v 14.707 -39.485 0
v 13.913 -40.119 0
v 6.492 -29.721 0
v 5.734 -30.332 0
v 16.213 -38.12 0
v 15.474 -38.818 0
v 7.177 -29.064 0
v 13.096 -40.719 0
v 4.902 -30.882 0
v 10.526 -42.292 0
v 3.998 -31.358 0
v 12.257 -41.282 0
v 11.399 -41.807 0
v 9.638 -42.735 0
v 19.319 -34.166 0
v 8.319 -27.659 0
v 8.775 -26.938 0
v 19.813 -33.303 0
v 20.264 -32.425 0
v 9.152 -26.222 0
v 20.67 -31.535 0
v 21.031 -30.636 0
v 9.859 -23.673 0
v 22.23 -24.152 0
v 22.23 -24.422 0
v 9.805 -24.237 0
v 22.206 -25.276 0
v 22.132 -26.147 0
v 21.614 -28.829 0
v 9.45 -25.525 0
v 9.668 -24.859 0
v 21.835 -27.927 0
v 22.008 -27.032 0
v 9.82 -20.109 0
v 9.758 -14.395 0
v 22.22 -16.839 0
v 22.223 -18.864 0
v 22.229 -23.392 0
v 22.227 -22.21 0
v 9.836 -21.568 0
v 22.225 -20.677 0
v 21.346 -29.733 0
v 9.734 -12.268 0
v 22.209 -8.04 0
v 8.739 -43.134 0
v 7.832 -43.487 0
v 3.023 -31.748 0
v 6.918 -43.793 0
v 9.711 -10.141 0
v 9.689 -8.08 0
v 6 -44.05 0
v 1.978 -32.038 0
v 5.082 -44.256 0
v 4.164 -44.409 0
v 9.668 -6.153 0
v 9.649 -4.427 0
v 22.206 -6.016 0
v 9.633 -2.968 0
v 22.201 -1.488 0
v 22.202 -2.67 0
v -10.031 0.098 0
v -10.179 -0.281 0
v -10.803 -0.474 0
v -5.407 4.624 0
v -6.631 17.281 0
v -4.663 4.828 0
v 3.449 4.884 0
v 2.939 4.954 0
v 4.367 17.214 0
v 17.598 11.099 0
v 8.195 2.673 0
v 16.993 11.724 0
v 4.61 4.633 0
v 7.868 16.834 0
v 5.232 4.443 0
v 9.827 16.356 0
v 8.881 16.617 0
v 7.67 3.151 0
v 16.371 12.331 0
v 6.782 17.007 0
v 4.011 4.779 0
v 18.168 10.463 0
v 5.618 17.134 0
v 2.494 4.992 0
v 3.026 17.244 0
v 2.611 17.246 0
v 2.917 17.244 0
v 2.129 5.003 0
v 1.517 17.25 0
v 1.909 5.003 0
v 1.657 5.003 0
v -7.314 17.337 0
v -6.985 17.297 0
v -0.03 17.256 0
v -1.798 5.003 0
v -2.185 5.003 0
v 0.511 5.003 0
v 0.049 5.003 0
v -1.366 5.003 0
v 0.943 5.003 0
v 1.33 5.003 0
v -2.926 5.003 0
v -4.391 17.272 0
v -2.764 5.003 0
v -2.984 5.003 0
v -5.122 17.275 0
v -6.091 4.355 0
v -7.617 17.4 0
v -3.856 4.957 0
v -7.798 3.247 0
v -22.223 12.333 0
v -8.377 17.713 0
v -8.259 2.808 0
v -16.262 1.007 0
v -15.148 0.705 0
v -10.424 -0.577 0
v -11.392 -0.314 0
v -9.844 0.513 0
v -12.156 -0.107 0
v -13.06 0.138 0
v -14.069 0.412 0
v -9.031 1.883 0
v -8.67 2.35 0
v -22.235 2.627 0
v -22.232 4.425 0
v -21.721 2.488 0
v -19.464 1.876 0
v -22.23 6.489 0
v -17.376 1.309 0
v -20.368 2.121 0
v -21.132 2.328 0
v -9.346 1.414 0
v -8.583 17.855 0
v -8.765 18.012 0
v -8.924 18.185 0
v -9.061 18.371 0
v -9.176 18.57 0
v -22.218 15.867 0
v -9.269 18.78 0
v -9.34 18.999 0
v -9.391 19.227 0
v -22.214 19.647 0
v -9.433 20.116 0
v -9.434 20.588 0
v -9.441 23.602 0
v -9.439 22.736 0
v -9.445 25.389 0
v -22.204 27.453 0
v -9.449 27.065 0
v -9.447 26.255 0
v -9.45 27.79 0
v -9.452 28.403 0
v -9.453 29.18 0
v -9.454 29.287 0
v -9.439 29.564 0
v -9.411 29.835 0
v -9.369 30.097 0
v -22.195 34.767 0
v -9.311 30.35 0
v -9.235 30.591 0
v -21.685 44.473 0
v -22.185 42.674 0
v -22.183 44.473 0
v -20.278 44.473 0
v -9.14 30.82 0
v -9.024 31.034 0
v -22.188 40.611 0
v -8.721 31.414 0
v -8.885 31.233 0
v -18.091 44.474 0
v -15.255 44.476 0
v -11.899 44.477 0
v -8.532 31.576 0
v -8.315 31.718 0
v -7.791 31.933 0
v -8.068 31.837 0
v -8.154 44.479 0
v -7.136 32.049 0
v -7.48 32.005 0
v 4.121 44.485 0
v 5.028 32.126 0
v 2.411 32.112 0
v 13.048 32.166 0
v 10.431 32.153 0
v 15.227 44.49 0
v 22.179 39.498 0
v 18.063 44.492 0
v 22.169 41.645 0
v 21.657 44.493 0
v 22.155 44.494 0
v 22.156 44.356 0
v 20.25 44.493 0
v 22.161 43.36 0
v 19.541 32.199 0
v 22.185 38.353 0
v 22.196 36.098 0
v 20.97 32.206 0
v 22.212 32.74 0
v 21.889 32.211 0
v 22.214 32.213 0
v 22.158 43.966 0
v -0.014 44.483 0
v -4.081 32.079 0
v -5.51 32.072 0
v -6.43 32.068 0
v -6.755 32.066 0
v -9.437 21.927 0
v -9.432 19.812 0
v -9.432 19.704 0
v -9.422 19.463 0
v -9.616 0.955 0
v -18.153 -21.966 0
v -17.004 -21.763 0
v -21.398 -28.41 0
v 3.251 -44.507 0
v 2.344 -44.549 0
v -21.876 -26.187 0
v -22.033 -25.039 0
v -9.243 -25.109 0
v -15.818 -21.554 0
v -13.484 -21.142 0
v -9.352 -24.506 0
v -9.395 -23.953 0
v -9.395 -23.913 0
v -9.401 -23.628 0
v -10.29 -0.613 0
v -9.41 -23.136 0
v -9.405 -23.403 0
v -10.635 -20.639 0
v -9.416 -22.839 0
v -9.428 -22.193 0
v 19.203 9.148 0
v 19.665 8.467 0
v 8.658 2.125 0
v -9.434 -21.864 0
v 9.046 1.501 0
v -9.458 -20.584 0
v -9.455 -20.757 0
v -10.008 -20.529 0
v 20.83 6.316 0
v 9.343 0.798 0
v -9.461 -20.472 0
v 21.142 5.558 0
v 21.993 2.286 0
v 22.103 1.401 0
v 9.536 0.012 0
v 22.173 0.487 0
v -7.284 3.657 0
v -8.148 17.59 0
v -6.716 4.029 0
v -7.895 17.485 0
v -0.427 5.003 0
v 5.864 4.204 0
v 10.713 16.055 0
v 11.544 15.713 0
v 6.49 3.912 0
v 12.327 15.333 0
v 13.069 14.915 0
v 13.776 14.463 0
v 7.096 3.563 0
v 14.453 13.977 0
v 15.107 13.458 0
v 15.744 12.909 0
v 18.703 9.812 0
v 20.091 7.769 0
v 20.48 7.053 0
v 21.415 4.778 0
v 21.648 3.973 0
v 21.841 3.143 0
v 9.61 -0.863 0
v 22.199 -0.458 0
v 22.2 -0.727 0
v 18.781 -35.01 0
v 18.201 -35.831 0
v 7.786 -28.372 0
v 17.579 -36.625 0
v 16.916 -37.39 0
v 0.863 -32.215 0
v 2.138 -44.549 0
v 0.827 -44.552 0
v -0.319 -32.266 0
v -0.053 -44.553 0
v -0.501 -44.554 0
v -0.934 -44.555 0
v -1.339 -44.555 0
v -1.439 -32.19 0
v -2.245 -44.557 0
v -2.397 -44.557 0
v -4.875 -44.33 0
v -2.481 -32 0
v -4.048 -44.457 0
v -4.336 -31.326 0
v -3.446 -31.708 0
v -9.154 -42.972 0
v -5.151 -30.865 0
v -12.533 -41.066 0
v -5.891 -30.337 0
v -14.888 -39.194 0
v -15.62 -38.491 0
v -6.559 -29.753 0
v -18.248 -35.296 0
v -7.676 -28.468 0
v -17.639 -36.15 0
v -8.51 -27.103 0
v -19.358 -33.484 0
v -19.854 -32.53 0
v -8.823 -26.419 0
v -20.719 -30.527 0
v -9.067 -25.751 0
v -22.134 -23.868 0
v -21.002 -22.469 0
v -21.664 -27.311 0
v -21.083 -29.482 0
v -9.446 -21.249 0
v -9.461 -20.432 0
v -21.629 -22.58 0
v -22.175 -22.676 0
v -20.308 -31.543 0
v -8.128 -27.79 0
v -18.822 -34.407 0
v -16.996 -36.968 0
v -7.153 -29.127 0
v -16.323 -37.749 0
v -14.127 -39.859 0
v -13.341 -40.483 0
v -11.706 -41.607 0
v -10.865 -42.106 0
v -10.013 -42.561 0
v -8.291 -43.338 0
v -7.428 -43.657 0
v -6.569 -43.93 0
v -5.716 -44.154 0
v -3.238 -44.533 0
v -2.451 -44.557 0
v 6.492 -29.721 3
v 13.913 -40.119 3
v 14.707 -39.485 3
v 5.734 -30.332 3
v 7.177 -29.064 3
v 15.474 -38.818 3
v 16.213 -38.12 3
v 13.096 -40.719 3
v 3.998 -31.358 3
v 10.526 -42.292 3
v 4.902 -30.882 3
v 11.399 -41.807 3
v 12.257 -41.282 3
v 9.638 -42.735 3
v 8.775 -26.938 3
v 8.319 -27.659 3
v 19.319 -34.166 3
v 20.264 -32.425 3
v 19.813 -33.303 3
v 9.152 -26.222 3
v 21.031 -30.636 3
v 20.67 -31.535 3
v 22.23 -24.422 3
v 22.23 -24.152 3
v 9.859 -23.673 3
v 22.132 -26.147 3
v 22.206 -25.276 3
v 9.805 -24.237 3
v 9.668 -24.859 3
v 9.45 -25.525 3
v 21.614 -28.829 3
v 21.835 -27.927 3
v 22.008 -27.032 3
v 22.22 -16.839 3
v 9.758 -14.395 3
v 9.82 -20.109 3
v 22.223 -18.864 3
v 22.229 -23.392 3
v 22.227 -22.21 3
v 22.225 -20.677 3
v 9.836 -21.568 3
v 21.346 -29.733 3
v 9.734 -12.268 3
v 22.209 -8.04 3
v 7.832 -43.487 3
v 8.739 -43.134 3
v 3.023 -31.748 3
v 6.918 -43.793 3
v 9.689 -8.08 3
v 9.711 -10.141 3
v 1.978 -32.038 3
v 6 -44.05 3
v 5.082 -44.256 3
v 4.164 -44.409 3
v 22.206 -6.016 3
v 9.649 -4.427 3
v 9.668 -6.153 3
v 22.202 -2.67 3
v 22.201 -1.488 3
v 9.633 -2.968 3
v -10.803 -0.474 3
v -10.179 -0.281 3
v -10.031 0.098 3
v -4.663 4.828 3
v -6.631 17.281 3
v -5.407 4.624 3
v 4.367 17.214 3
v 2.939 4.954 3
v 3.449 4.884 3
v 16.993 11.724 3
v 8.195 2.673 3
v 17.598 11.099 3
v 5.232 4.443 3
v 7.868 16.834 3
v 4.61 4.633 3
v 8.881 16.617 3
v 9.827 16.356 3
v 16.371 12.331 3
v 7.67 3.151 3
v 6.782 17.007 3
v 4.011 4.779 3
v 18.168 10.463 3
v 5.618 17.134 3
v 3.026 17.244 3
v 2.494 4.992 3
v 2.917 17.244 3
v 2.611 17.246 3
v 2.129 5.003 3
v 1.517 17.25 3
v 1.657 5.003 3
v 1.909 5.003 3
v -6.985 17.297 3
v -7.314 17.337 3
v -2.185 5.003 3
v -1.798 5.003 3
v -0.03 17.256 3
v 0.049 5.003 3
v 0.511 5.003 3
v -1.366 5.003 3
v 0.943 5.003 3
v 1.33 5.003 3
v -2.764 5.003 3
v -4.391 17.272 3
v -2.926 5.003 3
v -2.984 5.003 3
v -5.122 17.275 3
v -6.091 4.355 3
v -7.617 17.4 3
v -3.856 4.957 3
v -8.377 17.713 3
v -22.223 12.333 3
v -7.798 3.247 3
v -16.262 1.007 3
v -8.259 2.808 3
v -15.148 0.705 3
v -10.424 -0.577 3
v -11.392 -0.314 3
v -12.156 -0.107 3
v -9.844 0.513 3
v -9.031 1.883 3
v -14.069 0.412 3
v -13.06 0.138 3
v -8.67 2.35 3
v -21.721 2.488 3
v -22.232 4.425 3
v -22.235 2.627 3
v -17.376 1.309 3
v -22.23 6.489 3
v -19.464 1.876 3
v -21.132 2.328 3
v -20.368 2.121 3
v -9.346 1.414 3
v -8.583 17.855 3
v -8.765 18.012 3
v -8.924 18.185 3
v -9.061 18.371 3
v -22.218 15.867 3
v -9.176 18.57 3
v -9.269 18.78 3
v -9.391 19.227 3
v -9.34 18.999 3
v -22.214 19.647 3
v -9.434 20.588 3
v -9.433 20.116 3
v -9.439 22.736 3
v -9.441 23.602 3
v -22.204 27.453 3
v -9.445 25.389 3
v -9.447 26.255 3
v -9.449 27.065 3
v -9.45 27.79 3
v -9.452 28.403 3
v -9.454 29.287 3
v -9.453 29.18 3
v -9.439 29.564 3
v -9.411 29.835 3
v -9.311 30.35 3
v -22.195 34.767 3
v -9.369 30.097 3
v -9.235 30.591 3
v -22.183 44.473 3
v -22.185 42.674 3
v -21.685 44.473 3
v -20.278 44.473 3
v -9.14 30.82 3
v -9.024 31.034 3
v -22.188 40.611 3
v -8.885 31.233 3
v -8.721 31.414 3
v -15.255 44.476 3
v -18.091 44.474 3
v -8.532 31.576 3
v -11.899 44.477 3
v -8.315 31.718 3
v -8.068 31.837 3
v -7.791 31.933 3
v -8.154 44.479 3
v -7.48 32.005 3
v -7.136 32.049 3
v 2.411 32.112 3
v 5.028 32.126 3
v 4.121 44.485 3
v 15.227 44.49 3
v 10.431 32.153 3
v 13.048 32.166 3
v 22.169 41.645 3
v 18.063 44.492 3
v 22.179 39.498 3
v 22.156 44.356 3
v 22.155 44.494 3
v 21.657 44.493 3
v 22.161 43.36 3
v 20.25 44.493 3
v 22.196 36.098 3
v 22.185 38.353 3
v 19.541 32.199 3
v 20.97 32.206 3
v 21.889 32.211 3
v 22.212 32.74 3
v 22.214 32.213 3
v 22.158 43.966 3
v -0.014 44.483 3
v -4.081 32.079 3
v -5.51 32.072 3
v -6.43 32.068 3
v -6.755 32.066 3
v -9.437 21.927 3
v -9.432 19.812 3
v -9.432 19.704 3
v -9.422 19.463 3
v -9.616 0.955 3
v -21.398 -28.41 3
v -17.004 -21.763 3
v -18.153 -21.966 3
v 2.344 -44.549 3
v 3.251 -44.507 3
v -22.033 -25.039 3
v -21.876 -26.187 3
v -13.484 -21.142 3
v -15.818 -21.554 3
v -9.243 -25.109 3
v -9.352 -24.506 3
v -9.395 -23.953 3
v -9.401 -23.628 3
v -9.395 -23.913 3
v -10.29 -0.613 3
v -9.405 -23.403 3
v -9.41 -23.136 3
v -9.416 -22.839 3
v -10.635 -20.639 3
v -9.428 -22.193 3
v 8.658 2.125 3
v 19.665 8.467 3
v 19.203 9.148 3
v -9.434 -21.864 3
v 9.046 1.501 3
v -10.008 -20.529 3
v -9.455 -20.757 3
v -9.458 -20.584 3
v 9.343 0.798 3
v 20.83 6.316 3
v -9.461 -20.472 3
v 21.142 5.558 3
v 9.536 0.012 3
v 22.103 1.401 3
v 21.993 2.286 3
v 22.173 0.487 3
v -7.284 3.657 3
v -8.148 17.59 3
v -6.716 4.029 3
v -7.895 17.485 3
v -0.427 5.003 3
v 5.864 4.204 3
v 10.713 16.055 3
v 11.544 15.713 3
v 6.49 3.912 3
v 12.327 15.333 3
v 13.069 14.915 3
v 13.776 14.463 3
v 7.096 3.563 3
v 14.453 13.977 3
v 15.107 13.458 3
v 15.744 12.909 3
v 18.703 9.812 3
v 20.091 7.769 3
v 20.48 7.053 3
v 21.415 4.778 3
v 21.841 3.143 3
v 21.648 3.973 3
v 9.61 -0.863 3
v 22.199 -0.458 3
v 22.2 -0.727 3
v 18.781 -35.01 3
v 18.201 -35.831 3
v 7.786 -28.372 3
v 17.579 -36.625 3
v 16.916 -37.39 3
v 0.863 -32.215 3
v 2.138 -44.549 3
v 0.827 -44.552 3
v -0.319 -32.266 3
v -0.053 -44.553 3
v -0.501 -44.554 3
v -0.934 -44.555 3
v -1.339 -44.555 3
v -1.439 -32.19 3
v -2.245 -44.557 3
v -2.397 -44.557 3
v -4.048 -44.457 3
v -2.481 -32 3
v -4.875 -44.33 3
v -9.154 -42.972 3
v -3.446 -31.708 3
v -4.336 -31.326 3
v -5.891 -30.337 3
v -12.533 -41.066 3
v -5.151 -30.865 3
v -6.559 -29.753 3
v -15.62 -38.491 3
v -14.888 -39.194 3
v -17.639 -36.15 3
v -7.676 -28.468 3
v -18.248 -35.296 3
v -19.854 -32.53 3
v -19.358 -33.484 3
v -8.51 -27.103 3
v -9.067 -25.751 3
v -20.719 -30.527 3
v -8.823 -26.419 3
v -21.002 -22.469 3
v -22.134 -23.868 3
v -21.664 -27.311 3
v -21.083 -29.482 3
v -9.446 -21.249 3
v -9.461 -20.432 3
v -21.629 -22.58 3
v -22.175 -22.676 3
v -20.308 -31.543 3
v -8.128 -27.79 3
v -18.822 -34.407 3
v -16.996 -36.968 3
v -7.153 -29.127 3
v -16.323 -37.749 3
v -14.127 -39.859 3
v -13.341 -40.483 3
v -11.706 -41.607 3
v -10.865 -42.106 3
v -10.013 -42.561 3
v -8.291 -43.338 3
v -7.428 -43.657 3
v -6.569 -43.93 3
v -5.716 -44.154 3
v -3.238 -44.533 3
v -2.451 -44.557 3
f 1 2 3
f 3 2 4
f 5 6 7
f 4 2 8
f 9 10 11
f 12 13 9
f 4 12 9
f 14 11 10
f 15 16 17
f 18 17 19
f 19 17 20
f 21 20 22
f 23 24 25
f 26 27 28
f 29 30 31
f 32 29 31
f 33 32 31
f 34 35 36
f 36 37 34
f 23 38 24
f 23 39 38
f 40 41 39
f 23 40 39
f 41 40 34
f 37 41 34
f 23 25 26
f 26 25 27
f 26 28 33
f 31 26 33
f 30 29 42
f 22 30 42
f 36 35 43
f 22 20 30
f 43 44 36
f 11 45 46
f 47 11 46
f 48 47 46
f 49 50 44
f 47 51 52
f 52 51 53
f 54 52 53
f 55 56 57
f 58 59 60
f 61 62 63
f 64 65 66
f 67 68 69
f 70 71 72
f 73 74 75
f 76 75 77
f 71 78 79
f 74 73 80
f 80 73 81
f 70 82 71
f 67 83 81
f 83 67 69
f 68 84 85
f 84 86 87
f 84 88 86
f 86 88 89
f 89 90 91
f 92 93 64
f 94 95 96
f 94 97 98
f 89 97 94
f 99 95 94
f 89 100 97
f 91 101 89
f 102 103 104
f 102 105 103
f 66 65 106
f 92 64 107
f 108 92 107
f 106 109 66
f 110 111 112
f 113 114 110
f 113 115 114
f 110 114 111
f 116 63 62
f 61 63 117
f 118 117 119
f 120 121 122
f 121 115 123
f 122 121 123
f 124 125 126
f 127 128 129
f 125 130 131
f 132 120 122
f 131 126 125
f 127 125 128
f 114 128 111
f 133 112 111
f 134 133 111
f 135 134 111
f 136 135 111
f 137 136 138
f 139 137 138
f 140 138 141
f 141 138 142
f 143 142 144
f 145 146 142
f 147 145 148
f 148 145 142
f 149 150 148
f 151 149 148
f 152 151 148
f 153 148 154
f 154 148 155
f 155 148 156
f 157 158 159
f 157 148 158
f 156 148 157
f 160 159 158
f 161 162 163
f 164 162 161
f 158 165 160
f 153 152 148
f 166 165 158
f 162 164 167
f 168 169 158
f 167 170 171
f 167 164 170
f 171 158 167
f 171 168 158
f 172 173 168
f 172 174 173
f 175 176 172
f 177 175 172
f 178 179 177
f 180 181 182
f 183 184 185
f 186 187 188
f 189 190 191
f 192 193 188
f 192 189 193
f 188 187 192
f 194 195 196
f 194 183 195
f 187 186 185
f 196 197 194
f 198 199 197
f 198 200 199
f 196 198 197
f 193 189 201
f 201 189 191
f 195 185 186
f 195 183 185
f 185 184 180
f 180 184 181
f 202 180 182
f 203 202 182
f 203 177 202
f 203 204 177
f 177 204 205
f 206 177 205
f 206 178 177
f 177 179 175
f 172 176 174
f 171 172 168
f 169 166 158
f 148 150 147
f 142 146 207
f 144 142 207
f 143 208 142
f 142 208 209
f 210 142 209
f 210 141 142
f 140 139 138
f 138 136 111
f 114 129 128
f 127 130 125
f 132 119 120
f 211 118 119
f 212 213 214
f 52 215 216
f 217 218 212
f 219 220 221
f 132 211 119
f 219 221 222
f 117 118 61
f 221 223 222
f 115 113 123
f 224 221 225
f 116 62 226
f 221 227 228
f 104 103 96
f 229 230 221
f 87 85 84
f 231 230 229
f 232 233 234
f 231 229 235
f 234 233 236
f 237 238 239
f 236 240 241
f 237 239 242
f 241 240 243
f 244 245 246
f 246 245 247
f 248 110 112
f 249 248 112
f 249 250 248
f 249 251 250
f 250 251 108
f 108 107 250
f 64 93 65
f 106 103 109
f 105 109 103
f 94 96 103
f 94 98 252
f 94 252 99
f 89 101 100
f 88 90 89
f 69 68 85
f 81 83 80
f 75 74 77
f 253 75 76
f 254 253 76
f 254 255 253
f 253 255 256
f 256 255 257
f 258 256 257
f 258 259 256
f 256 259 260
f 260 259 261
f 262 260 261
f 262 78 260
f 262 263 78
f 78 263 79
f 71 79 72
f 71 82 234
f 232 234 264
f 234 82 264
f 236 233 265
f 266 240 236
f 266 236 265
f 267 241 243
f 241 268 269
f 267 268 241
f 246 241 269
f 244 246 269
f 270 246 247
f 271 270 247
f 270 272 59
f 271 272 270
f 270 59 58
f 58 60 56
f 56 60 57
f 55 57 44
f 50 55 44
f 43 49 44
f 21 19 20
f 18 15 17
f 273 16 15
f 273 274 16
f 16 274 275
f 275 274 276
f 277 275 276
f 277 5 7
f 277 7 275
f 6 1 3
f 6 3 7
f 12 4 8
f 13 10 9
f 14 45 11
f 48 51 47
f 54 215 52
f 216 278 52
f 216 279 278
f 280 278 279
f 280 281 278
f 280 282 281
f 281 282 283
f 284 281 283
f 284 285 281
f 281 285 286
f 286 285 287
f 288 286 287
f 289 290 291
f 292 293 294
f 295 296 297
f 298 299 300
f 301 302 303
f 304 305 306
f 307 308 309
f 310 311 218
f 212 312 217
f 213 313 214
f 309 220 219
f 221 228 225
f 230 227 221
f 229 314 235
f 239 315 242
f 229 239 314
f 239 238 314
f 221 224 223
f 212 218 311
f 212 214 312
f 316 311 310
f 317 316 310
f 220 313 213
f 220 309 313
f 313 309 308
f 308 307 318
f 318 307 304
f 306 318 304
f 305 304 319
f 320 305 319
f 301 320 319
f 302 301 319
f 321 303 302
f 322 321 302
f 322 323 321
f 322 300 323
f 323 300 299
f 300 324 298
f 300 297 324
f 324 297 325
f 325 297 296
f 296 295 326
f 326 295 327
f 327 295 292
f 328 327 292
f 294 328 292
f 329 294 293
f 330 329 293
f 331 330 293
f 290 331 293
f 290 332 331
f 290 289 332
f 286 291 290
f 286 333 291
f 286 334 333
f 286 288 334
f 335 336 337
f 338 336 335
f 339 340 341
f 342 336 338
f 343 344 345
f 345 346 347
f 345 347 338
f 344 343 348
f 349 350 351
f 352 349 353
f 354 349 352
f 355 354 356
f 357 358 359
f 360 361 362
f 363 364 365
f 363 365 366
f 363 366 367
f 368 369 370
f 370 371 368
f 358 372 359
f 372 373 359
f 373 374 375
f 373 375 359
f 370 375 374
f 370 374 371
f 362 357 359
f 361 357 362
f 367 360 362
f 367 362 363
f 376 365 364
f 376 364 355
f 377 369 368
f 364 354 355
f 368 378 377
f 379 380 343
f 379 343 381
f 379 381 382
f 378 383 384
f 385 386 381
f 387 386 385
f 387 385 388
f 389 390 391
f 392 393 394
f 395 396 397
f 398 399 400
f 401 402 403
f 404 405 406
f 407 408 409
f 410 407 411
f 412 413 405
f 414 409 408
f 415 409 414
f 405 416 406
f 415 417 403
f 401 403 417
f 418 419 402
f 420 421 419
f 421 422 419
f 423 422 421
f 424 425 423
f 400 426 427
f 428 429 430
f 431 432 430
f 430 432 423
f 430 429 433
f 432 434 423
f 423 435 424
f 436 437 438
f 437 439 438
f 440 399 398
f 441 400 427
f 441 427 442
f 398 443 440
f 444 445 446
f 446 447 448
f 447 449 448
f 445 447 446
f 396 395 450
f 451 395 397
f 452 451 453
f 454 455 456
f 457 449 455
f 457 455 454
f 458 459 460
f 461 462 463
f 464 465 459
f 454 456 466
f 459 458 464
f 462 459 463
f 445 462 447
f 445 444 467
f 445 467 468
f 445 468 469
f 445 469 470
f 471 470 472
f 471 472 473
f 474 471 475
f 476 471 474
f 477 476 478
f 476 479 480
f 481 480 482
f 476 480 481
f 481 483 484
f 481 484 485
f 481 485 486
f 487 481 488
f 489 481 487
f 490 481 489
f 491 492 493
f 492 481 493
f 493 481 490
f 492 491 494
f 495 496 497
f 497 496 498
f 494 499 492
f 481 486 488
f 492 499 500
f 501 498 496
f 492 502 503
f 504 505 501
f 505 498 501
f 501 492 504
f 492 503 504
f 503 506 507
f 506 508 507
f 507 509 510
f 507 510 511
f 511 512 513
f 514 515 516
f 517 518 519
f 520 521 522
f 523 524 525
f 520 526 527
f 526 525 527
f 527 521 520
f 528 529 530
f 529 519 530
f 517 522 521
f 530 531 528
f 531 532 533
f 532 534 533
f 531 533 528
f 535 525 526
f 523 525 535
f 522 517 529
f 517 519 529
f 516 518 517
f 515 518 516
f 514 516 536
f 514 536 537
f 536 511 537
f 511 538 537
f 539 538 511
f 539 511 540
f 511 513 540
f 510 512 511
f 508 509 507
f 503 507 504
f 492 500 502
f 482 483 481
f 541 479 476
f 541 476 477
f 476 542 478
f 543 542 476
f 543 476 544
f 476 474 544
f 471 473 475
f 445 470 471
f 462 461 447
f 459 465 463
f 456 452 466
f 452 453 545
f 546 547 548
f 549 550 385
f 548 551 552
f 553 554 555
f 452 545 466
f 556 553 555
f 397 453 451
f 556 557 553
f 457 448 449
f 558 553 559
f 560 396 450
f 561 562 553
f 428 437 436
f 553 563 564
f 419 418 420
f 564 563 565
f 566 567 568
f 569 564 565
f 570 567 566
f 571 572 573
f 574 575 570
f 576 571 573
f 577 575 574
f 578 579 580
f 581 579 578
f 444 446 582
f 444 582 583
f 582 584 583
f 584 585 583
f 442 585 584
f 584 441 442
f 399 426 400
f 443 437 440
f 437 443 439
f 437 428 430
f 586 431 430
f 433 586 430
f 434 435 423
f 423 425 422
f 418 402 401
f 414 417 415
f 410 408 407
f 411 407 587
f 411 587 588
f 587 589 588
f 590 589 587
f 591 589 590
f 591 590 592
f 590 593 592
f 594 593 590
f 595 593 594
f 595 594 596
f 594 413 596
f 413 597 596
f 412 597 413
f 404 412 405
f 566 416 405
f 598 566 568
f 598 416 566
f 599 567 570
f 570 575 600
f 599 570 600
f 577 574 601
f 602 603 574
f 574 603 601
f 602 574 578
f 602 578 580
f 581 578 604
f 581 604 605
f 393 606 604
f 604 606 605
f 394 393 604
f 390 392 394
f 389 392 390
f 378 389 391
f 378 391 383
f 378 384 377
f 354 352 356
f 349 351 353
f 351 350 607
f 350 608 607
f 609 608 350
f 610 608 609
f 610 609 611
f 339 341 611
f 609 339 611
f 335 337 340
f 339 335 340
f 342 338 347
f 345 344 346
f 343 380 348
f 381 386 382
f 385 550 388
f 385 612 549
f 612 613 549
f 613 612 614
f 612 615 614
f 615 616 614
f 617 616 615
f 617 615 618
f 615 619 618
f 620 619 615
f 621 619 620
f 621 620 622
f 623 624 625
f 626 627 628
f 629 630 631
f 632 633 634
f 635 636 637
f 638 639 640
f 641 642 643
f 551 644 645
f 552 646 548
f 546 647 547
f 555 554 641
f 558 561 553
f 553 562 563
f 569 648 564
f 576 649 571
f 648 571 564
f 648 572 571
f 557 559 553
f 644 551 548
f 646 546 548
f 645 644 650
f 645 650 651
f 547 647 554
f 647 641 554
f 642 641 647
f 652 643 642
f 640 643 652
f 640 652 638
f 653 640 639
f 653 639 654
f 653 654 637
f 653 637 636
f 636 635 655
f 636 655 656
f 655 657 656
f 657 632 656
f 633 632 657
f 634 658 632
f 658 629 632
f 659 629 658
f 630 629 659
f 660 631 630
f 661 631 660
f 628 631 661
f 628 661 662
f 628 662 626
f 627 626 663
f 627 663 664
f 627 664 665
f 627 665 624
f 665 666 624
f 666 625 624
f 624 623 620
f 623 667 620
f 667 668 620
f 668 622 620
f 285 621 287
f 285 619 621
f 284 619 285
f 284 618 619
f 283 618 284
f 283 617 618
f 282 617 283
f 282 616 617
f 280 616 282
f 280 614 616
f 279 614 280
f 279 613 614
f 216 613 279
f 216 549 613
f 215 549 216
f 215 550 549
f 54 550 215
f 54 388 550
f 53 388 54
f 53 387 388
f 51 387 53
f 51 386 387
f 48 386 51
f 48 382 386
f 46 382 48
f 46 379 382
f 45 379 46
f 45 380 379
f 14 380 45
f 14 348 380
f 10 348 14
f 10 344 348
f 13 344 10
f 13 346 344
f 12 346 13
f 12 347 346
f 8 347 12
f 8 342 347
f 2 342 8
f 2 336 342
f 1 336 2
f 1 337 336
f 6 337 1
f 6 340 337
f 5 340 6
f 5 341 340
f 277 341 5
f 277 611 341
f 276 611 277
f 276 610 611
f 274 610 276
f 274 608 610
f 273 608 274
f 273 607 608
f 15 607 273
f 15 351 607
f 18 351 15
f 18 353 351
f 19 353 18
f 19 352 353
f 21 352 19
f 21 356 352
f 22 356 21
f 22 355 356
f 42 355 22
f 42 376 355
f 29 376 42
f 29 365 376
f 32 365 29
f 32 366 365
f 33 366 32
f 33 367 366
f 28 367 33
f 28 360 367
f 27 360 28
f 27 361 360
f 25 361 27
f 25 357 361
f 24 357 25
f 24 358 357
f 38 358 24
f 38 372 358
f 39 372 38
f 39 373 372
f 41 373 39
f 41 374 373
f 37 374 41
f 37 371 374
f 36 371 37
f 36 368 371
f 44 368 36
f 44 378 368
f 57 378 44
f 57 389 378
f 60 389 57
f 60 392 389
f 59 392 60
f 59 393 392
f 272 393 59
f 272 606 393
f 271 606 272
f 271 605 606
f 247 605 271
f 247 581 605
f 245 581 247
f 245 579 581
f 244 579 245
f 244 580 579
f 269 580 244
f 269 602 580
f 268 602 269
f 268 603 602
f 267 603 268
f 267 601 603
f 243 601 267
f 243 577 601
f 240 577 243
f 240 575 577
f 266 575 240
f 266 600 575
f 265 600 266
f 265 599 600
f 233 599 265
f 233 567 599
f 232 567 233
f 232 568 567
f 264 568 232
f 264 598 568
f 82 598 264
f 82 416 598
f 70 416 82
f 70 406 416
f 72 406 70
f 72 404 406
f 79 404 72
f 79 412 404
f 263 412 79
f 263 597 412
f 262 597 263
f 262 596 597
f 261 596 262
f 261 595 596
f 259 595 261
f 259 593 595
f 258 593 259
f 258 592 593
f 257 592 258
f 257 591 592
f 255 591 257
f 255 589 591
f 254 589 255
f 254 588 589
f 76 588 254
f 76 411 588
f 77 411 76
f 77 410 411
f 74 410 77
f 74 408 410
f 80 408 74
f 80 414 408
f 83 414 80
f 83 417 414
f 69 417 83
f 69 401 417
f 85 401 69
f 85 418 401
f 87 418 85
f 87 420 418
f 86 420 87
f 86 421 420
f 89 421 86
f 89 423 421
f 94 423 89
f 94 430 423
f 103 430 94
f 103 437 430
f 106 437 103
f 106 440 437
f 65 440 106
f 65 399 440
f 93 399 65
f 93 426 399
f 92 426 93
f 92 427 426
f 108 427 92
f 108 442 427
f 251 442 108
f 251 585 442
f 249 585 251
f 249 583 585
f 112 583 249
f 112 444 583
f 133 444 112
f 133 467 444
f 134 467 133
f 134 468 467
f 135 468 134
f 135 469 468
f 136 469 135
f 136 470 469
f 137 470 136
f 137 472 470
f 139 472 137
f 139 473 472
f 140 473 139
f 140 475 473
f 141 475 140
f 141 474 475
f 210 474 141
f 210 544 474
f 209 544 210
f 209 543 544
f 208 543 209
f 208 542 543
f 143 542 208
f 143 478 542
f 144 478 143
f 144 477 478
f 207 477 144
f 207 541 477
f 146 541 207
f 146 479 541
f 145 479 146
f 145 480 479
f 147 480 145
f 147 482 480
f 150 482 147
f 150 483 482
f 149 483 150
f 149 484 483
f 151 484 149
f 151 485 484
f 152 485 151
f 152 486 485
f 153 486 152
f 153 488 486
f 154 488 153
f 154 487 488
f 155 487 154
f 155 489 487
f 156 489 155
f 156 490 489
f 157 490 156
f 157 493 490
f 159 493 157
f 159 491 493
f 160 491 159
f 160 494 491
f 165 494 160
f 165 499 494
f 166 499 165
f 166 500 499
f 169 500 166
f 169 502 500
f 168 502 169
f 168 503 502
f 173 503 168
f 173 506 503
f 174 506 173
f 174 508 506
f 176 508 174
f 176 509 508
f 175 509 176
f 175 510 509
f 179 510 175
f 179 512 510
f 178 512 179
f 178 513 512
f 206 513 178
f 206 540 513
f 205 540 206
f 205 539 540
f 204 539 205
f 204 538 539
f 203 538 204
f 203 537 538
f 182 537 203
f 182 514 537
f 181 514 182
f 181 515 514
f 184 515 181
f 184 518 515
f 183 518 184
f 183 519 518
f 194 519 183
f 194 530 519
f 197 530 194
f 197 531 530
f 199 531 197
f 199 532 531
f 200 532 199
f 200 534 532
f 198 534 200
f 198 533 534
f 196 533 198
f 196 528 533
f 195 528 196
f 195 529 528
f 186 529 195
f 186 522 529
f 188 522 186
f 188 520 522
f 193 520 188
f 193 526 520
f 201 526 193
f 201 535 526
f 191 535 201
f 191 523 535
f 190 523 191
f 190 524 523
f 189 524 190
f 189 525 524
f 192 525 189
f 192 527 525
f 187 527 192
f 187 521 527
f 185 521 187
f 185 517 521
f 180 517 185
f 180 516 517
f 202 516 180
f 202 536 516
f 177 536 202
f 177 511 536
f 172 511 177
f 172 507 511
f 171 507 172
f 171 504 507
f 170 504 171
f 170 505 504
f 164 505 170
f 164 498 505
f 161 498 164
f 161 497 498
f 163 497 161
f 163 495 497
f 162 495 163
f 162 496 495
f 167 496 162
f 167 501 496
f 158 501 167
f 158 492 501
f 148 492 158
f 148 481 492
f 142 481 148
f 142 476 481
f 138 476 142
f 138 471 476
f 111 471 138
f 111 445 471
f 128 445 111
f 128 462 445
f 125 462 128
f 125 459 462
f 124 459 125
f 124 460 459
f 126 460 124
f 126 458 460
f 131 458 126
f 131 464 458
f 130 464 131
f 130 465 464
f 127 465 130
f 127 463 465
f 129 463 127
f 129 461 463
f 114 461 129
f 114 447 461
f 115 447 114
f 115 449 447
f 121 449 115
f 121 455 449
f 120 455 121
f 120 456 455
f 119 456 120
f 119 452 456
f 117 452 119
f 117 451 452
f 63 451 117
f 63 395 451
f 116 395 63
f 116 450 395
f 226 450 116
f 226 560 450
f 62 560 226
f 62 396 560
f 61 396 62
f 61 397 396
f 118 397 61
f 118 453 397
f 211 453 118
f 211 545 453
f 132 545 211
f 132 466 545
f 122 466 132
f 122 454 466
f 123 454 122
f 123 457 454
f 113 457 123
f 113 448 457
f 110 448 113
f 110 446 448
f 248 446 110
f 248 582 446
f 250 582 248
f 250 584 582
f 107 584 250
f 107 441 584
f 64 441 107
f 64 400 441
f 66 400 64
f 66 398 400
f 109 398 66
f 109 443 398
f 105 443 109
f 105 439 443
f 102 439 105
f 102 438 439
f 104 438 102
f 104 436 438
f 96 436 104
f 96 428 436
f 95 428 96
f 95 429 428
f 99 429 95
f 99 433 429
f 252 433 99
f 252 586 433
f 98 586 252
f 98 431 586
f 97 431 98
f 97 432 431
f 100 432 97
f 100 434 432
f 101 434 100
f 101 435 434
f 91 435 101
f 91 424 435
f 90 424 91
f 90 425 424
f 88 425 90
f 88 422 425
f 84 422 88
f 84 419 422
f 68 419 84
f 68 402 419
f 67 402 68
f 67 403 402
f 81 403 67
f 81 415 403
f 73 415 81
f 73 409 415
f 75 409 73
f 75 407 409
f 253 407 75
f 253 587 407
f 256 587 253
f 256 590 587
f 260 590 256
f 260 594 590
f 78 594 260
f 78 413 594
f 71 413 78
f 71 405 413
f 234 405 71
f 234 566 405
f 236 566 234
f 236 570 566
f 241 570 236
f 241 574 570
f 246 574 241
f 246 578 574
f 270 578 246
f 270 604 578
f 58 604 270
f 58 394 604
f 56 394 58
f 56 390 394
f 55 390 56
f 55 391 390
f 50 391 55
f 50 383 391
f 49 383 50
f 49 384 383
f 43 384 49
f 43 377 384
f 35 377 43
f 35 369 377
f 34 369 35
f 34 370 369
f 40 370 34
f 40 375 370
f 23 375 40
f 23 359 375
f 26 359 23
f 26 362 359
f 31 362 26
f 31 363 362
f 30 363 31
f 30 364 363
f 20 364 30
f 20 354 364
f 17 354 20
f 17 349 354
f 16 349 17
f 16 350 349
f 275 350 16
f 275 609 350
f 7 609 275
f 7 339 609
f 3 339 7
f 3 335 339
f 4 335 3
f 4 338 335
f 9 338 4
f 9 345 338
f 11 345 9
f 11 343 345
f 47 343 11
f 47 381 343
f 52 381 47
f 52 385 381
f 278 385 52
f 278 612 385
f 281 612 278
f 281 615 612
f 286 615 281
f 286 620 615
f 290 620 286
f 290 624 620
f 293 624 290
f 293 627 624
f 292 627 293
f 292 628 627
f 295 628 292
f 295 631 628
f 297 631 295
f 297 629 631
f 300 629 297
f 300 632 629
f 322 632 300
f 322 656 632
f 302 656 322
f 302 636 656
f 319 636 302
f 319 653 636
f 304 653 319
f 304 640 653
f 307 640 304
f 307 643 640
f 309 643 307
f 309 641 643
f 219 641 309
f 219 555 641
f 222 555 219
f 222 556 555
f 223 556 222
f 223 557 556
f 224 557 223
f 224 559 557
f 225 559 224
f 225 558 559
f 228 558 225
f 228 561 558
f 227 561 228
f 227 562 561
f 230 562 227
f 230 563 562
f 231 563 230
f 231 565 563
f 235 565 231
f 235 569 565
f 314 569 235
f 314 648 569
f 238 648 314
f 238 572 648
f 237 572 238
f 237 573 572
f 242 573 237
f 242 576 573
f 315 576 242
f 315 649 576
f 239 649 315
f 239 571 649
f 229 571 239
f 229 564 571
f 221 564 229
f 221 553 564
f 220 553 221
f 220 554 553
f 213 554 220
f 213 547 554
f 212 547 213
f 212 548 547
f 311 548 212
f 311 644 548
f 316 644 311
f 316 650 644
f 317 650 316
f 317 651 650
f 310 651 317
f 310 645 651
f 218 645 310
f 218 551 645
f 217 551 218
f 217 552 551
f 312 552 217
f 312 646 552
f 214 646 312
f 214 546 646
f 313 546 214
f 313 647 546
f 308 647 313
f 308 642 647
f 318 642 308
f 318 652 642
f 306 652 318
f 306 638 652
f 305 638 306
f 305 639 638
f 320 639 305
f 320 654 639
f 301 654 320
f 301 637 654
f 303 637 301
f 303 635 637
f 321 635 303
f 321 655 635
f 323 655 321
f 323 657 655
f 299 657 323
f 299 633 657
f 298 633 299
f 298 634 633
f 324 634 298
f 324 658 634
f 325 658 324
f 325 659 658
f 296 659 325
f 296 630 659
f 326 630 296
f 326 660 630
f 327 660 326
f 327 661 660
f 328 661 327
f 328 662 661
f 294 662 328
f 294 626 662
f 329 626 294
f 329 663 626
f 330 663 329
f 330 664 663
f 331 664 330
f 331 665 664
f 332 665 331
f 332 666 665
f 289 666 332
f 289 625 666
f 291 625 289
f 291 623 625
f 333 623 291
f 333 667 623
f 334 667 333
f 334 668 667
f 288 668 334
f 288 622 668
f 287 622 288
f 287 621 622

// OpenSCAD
// Generated from 交通部公路局（原交通部公路總局）「新式號牌使用之英文字、數字字體」author trace
fudge = 0.1;

module glyph_2012_5(h = 3) {
  difference() {
    linear_extrude(height = h)
      polygon(points = [[-22.1829, 44.4726], [-22.1835, 44.0026], [-22.1852, 42.6745], [-22.1877, 40.6109], [-22.191, 37.9343], [-22.1949, 34.7673], [-22.1993, 31.2325], [-22.204, 27.4526], [-22.2088, 23.55], [-22.2136, 19.6474], [-22.2182, 15.8675], [-22.2226, 12.3327], [-22.2265, 9.1657], [-22.2298, 6.4891], [-22.2324, 4.4255], [-22.234, 3.0974], [-22.2346, 2.6274], [-22.1004, 2.591], [-21.7213, 2.4882], [-21.1323, 2.3283], [-20.3682, 2.121], [-19.4642, 1.8758], [-18.4552, 1.602], [-17.3762, 1.3092], [-16.2622, 1.007], [-15.1482, 0.7047], [-14.0692, 0.412], [-13.0602, 0.1382], [-12.1562, -0.107], [-11.3921, -0.3143], [-10.803, -0.4742], [-10.4239, -0.577], [-10.2898, -0.6134], [-10.1786, -0.2806], [-10.0307, 0.0979], [-9.844, 0.5127], [-9.6165, 0.9547], [-9.3463, 1.4144], [-9.0313, 1.8828], [-8.6696, 2.3505], [-8.2592, 2.8083], [-7.7981, 3.2469], [-7.2843, 3.6571], [-6.7159, 4.0295], [-6.0907, 4.3551], [-5.407, 4.6244], [-4.6626, 4.8283], [-3.8556, 4.9574], [-2.9839, 5.0026], [-2.9265, 5.0026], [-2.7642, 5.0027], [-2.5121, 5.0027], [-2.185, 5.0027], [-1.7981, 5.0028], [-1.3662, 5.0028], [-0.9043, 5.0029], [-0.4275, 5.003], [0.0494, 5.003], [0.5112, 5.0031], [0.9431, 5.0031], [1.3301, 5.0032], [1.6571, 5.0032], [1.9093, 5.0033], [2.0716, 5.0033], [2.129, 5.0033], [2.4939, 4.9921], [2.9387, 4.9539], [3.4491, 4.8843], [4.0109, 4.7789], [4.6101, 4.6334], [5.2325, 4.4434], [5.8638, 4.2045], [6.4898, 3.9124], [7.0965, 3.5628], [7.6696, 3.1512], [8.195, 2.6733], [8.6585, 2.1248], [9.0459, 1.5013], [9.343, 0.7985], [9.5357, 0.0119], [9.6098, -0.8627], [9.6126, -1.1189], [9.6205, -1.8429], [9.6328, -2.9678], [9.6488, -4.4269], [9.6676, -6.1533], [9.6887, -8.0801], [9.7112, -10.1407], [9.7345, -12.268], [9.7577, -14.3954], [9.7802, -16.4559], [9.8013, -18.3827], [9.8202, -20.1091], [9.8361, -21.5682], [9.8484, -22.6931], [9.8563, -23.4171], [9.8591, -23.6733], [9.8048, -24.2372], [9.6682, -24.8588], [9.4503, -25.5249], [9.1521, -26.2224], [8.7747, -26.9381], [8.319, -27.659], [7.786, -28.372], [7.1769, -29.0639], [6.4925, -29.7215], [5.7339, -30.3319], [4.9021, -30.8819], [3.9981, -31.3583], [3.023, -31.7481], [1.9777, -32.0381], [0.8633, -32.2153], [-0.3192, -32.2664], [-1.4386, -32.1902], [-2.4806, -32.0001], [-3.446, -31.7081], [-4.3358, -31.3257], [-5.1507, -30.8646], [-5.8913, -30.3366], [-6.5587, -29.7535], [-7.1535, -29.1268], [-7.6765, -28.4683], [-8.1285, -27.7898], [-8.5104, -27.1029], [-8.8228, -26.4193], [-9.0667, -25.7508], [-9.2427, -25.1091], [-9.3518, -24.5059], [-9.3946, -23.9528], [-9.3953, -23.9133], [-9.3974, -23.8015], [-9.4007, -23.6279], [-9.405, -23.4028], [-9.41, -23.1363], [-9.4157, -22.8389], [-9.4217, -22.5209], [-9.4279, -22.1926], [-9.4342, -21.8643], [-9.4402, -21.5463], [-9.4458, -21.2489], [-9.4509, -20.9825], [-9.4552, -20.7573], [-9.4584, -20.5837], [-9.4606, -20.472], [-9.4613, -20.4324], [-9.6041, -20.4576], [-10.0076, -20.5288], [-10.6346, -20.6395], [-11.4479, -20.783], [-12.4101, -20.9528], [-13.4841, -21.1423], [-14.6326, -21.345], [-15.8184, -21.5543], [-17.0041, -21.7635], [-18.1526, -21.9662], [-19.2266, -22.1557], [-20.1888, -22.3255], [-21.0021, -22.469], [-21.6291, -22.5797], [-22.0326, -22.6509], [-22.1754, -22.6761], [-22.1341, -23.8684], [-22.0335, -25.0391], [-21.876, -26.1871], [-21.6636, -27.3111], [-21.3984, -28.41], [-21.0828, -29.4825], [-20.7187, -30.5274], [-20.3084, -31.5435], [-19.854, -32.5296], [-19.3577, -33.4845], [-18.8216, -34.4071], [-18.248, -35.2959], [-17.6389, -36.15], [-16.9965, -36.968], [-16.323, -37.7488], [-15.6205, -38.4911], [-14.8885, -39.1945], [-14.1275, -39.8587], [-13.341, -40.4828], [-12.5328, -41.066], [-11.7064, -41.6074], [-10.8654, -42.1062], [-10.0135, -42.5614], [-9.1542, -42.9722], [-8.2913, -43.3378], [-7.4282, -43.6573], [-6.5687, -43.9298], [-5.7164, -44.1544], [-4.8748, -44.3303], [-4.0476, -44.4567], [-3.2384, -44.5326], [-2.4508, -44.5571], [-2.3969, -44.5571], [-2.2448, -44.5568], [-2.0083, -44.5564], [-1.7016, -44.5559], [-1.3388, -44.5553], [-0.9338, -44.5546], [-0.5007, -44.5539], [-0.0535, -44.5531], [0.3936, -44.5524], [0.8267, -44.5517], [1.2317, -44.551], [1.5946, -44.5504], [1.9013, -44.5499], [2.1377, -44.5495], [2.2899, -44.5492], [2.3437, -44.5491], [3.2509, -44.5074], [4.1645, -44.4092], [5.0818, -44.2562], [6.0005, -44.0504], [6.918, -43.7934], [7.8318, -43.4873], [8.7393, -43.1337], [9.6381, -42.7346], [10.5257, -42.2917], [11.3995, -41.8069], [12.257, -41.282], [13.0958, -40.7188], [13.9133, -40.1193], [14.7069, -39.4851], [15.4742, -38.8182], [16.2128, -38.1204], [16.916, -37.3897], [17.5789, -36.6252], [18.2008, -35.8307], [18.781, -35.0098], [19.3187, -34.1661], [19.8133, -33.3032], [20.264, -32.4248], [20.6701, -31.5346], [21.031, -30.6361], [21.3459, -29.733], [21.6142, -28.8289], [21.835, -27.9275], [22.0078, -27.0325], [22.1317, -26.1474], [22.2062, -25.2759], [22.2304, -24.4216], [22.2301, -24.1525], [22.2291, -23.392], [22.2275, -22.2102], [22.2255, -20.6773], [22.2232, -18.8637], [22.2205, -16.8394], [22.2177, -14.6747], [22.2148, -12.4399], [22.2119, -10.205], [22.2091, -8.0403], [22.2065, -6.016], [22.2041, -4.2024], [22.2021, -2.6696], [22.2006, -1.4878], [22.1996, -0.7272], [22.1992, -0.4581], [22.1726, 0.487], [22.1035, 1.4014], [21.9927, 2.2862], [21.8406, 3.143], [21.6477, 3.973], [21.4146, 4.7777], [21.142, 5.5583], [20.8301, 6.3162], [20.4798, 7.0527], [20.0914, 7.7693], [19.6655, 8.4672], [19.2027, 9.1478], [18.7035, 9.8125], [18.1685, 10.4626], [17.5981, 11.0995], [16.993, 11.7245], [16.3706, 12.3306], [15.7439, 12.9091], [15.1067, 13.4584], [14.4526, 13.9768], [13.7756, 14.4631], [13.0693, 14.9155], [12.3275, 15.3326], [11.544, 15.7128], [10.7126, 16.0546], [9.8269, 16.3565], [8.8809, 16.617], [7.8681, 16.8345], [6.7825, 17.0074], [5.6177, 17.1344], [4.3675, 17.2138], [3.0258, 17.2441], [2.9173, 17.2445], [2.6108, 17.2457], [2.1346, 17.2475], [1.5169, 17.2498], [0.786, 17.2526], [-0.0297, 17.2557], [-0.9021, 17.259], [-1.8027, 17.2624], [-2.7033, 17.2658], [-3.5757, 17.2691], [-4.3914, 17.2722], [-5.1223, 17.275], [-5.74, 17.2773], [-6.2162, 17.2791], [-6.5227, 17.2803], [-6.6312, 17.2807], [-6.9853, 17.297], [-7.3137, 17.3373], [-7.6166, 17.4004], [-7.8946, 17.485], [-8.148, 17.5898], [-8.3772, 17.7134], [-8.5827, 17.8547], [-8.7649, 18.0123], [-8.9241, 18.1849], [-9.0609, 18.3712], [-9.1756, 18.5699], [-9.2686, 18.7797], [-9.3403, 18.9993], [-9.3912, 19.2275], [-9.4216, 19.4629], [-9.432, 19.7042], [-9.4323, 19.8118], [-9.433, 20.1159], [-9.434, 20.5885], [-9.4354, 21.2015], [-9.4371, 21.9268], [-9.4389, 22.7363], [-9.4409, 23.602], [-9.4429, 24.4957], [-9.4449, 25.3894], [-9.4469, 26.2551], [-9.4487, 27.0646], [-9.4504, 27.7898], [-9.4517, 28.4028], [-9.4528, 28.8754], [-9.4535, 29.1796], [-9.4538, 29.2872], [-9.4388, 29.5645], [-9.4111, 29.835], [-9.3691, 30.0974], [-9.311, 30.3501], [-9.2352, 30.5914], [-9.14, 30.82], [-9.0238, 31.0343], [-8.8849, 31.2327], [-8.7215, 31.4137], [-8.5322, 31.5759], [-8.315, 31.7176], [-8.0685, 31.8373], [-7.7909, 31.9335], [-7.4805, 32.0047], [-7.1358, 32.0494], [-6.7549, 32.066], [-6.4296, 32.0676], [-5.5101, 32.0723], [-4.0815, 32.0795], [-2.2285, 32.0889], [-0.036, 32.1], [2.4111, 32.1124], [5.028, 32.1256], [7.7297, 32.1393], [10.4314, 32.153], [13.0483, 32.1662], [15.4954, 32.1786], [17.6879, 32.1897], [19.5409, 32.1991], [20.9696, 32.2063], [21.889, 32.211], [22.2144, 32.2127], [22.2137, 32.3506], [22.2118, 32.7403], [22.2089, 33.346], [22.2051, 34.1315], [22.2006, 35.061], [22.1956, 36.0984], [22.1903, 37.2078], [22.1848, 38.3531], [22.1792, 39.4985], [22.1739, 40.6078], [22.1689, 41.6452], [22.1644, 42.5747], [22.1606, 43.3602], [22.1577, 43.9659], [22.1558, 44.3557], [22.1552, 44.4936], [21.6572, 44.4934], [20.25, 44.4927], [18.0634, 44.4917], [15.2273, 44.4903], [11.8717, 44.4887], [8.1263, 44.4869], [4.1212, 44.485], [-0.0139, 44.4831], [-4.1489, 44.4811], [-8.1541, 44.4792], [-11.8994, 44.4775], [-15.2551, 44.4759], [-18.0912, 44.4745], [-20.2778, 44.4735], [-21.685, 44.4728]]);
  }
}

glyph_2012_5();
